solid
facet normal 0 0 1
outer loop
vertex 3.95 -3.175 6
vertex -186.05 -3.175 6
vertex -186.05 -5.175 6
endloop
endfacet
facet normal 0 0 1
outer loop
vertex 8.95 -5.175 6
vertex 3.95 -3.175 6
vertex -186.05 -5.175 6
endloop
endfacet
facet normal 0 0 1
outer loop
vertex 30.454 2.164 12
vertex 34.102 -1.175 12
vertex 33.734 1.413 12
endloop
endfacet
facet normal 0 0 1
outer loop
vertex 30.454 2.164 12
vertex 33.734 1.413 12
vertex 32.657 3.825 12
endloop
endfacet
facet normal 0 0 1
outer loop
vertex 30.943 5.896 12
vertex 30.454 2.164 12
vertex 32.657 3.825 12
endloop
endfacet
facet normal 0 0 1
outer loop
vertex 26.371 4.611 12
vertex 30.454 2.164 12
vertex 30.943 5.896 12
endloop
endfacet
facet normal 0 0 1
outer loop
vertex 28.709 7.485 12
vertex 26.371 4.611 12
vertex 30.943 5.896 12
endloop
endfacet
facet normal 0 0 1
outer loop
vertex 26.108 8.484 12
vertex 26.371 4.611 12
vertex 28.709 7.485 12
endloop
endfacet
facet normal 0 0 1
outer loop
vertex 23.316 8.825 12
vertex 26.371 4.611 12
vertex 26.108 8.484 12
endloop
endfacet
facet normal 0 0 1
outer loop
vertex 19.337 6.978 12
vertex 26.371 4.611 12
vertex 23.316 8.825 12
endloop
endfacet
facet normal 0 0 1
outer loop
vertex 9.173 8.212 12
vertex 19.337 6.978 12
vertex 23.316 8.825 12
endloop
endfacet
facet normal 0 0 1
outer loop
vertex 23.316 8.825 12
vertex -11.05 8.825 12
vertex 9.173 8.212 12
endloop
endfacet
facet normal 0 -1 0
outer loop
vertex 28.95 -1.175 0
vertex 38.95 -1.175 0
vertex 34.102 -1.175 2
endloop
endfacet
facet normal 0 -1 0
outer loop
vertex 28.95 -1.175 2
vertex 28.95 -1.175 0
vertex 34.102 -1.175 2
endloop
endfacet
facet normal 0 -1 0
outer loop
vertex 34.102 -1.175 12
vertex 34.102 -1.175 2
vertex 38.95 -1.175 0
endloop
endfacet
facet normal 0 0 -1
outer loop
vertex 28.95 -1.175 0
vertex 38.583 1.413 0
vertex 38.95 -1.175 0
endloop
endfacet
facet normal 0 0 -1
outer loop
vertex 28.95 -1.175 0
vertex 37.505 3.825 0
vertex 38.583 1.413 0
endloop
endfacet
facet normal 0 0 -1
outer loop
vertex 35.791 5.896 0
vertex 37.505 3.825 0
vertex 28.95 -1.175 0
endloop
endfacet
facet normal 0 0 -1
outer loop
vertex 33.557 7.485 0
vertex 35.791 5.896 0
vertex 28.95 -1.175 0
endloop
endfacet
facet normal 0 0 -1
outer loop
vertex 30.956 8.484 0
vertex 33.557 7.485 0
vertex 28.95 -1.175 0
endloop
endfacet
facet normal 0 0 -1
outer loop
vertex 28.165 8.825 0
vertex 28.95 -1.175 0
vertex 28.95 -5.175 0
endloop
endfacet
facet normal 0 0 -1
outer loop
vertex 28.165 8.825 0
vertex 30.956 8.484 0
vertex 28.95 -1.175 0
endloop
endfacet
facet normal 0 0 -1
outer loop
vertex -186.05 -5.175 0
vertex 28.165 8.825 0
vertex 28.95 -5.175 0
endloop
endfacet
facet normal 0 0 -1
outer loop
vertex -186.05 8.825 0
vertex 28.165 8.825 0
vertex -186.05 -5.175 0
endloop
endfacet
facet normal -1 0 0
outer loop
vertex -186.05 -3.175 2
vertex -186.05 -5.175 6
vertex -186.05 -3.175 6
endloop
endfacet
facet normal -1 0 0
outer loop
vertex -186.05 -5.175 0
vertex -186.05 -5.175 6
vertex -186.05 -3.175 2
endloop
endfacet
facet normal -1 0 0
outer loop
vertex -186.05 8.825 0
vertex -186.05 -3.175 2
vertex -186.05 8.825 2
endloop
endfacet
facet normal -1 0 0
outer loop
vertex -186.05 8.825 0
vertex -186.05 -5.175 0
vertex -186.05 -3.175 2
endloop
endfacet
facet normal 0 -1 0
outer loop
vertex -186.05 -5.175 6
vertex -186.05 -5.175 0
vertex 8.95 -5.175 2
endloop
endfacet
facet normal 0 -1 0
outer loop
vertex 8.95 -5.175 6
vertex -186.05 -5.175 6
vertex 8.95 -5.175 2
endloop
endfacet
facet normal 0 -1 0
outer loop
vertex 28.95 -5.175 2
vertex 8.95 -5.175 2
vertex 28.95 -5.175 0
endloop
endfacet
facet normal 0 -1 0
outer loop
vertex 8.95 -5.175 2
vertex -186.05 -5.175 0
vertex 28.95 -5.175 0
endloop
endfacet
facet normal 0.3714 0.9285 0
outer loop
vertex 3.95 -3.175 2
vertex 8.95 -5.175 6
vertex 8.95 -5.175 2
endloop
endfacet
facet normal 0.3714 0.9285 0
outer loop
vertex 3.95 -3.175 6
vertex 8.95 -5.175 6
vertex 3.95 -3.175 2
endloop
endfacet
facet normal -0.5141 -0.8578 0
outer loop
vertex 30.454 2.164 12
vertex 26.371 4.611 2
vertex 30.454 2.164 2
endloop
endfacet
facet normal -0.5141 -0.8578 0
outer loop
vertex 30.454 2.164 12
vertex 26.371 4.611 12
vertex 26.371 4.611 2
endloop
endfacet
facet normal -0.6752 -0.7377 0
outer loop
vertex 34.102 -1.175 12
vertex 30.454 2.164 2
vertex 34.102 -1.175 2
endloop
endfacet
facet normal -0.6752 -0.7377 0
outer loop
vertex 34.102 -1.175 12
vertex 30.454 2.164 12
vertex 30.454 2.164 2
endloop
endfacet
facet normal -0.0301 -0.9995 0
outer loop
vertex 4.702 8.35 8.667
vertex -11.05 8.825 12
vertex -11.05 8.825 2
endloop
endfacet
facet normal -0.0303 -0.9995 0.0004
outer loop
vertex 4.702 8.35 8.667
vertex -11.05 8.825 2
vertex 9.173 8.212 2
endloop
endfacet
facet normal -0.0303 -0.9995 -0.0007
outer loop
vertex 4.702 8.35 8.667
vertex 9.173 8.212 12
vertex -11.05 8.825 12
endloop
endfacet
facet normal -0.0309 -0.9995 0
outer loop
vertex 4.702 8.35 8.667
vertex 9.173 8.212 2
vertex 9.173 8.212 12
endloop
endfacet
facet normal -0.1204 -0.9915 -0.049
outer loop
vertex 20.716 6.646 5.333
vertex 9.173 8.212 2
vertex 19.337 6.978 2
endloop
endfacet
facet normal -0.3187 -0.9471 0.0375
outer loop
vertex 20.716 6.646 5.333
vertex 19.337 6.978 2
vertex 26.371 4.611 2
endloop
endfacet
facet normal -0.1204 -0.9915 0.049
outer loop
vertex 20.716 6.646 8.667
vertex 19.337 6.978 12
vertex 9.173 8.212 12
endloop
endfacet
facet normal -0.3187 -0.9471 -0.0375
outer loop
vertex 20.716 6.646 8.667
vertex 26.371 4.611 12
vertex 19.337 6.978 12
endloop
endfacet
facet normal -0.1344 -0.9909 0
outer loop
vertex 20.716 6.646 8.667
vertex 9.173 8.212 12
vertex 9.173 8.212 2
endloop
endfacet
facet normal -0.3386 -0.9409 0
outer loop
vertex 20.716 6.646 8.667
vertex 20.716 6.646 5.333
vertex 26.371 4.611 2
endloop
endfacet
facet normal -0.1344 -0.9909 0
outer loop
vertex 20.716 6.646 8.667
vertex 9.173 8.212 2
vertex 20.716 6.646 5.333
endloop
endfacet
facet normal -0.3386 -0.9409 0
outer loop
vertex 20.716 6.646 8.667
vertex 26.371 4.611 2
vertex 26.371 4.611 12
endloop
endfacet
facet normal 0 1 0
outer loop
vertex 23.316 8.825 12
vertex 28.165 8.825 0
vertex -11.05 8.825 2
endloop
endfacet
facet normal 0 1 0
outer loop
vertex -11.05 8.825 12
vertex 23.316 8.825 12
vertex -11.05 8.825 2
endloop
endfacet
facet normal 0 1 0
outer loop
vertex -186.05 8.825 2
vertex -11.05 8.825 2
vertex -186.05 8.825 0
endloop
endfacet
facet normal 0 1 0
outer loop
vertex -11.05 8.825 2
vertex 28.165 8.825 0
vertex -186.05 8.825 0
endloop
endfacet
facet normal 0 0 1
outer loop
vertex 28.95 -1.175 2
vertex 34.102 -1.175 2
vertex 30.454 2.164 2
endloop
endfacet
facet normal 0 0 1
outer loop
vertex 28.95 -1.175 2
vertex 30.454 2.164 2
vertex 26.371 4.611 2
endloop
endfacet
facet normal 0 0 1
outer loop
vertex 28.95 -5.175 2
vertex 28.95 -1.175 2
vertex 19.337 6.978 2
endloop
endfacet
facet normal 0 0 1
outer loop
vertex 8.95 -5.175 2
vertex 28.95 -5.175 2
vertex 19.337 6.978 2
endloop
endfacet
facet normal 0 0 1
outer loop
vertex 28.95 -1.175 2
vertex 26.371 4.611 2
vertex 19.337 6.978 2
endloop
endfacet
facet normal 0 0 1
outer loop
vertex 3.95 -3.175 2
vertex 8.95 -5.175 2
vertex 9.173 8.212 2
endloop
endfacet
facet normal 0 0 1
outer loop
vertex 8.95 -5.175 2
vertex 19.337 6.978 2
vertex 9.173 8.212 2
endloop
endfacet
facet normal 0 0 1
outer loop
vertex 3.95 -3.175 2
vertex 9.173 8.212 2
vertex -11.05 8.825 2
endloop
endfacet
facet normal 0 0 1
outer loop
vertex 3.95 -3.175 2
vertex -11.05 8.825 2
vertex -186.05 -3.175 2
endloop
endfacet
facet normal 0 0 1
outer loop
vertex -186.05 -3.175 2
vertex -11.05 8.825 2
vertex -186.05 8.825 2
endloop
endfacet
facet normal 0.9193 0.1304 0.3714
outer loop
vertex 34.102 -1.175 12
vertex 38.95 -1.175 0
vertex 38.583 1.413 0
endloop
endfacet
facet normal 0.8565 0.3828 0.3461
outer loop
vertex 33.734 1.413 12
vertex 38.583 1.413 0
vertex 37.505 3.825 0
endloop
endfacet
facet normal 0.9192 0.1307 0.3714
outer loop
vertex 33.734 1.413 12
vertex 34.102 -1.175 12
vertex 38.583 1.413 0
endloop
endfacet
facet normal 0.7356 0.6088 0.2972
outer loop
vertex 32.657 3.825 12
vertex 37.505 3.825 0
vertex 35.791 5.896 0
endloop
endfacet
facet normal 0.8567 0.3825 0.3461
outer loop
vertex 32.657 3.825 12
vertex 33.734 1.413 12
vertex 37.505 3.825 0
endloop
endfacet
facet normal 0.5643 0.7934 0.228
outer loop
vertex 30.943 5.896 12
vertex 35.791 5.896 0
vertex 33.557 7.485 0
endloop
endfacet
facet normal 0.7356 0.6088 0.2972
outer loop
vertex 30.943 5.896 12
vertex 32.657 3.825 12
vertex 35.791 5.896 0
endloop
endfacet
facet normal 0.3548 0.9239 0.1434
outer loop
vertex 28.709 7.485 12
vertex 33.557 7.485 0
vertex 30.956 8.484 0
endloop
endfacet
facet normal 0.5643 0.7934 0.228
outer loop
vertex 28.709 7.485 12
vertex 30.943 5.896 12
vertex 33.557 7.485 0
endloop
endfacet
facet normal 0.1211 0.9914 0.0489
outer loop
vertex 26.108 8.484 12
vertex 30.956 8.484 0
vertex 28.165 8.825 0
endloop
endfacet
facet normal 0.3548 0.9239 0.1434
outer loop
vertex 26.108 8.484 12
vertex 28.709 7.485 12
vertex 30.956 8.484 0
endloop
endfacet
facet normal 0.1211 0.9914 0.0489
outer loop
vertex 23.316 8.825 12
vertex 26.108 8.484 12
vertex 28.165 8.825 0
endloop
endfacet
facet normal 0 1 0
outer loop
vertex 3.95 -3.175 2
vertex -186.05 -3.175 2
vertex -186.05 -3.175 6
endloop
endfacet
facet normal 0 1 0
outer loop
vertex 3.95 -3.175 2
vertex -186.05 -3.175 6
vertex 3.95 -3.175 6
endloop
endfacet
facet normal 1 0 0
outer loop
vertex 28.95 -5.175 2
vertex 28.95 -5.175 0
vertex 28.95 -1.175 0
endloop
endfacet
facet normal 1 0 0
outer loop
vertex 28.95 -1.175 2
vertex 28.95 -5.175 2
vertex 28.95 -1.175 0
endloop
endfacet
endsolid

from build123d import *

# Parameters (mm, degrees)
SKETCH1_W           = 215
SKETCH1_H           = 14
BOSS_EXTRUDE1_DEPTH = 2
SKETCH2_W           = 215
SKETCH2_H           = 2
BOSS_EXTRUDE2_DEPTH = 4
SKETCH3_W           = 10
SKETCH3_H           = 10
BOSS_EXTRUDE3_DEPTH = 2
CUT_EXTRUDE1_DEPTH  = 4
BOSS_EXTRUDE4_START = -175
SKETCH8_W           = 10
SKETCH8_H           = 10
BOSS_EXTRUDE4_DEPTH = 50
CUT_EXTRUDE5_DEPTH  = 50
FILLET2_R           = 10
CUT_EXTRUDE6_DEPTH  = 10


with BuildPart() as part:
    # Sketch1 → Boss-Extrude1 (new body)
    with BuildSketch(Plane.XY):
        with Locations((-78.55, 1.825)):
            Rectangle(SKETCH1_W, SKETCH1_H)
    extrude(amount=BOSS_EXTRUDE1_DEPTH)

    # Sketch2 → Boss-Extrude2 (add)
    with BuildSketch(Plane.XY.offset(2)):
        with Locations((-78.55, -4.175)):
            Rectangle(SKETCH2_W, SKETCH2_H)
    extrude(amount=BOSS_EXTRUDE2_DEPTH)

    # Sketch3 → Boss-Extrude3 (add)
    with BuildSketch(Plane(origin=(0, 0, 0), x_dir=(-1, 0, 0), z_dir=(0, 0, -1))):
        with Locations((-33.95, 3.825)):
            Rectangle(SKETCH3_W, SKETCH3_H)
    extrude(amount=-BOSS_EXTRUDE3_DEPTH)

    # Sketch4 → Cut-Extrude1 (cut)
    with BuildSketch(Plane.XY.offset(6)):
        Polygon((28.95, -5.175), (8.95, -5.175), (3.95, -3.175), (28.95, -3.175), align=None)
    extrude(amount=-CUT_EXTRUDE1_DEPTH, mode=Mode.SUBTRACT)

    # Sketch8 → Boss-Extrude4 (add)
    with BuildSketch(Plane.ZY.offset(186.05).offset(BOSS_EXTRUDE4_START)):
        with Locations((7, 3.825)):
            Rectangle(SKETCH8_W, SKETCH8_H)
    extrude(amount=-BOSS_EXTRUDE4_DEPTH)

    # Sketch12 → Cut-Extrude5 (cut)
    with BuildSketch(Plane.XZ.offset(1.175)):
        Polygon((38.95, 0), (34.10168529, 12), (38.95, 12), align=None)
    extrude(amount=-CUT_EXTRUDE5_DEPTH, mode=Mode.SUBTRACT)

    # Fillet2
    fillet2_edges = [part.edges().sort_by_distance(p)[0] for p in [
        (36.525842645, 8.825, 6),
    ]]
    fillet(fillet2_edges, radius=FILLET2_R - 0.0001)  # a hair under: the kernel refuses the full size

    # Sketch13 → Cut-Extrude6 (cut)
    with BuildSketch(Plane.XY.offset(12)):
        with BuildLine():
            Line((-11.05, 8.825), (-11.05, -1.175))
            Line((-11.05, -1.175), (34.10168529, -1.175))
            add(Edge.make_bspline(
                [(-11.05, 8.825), (3.606248202, 7.334330419), (22.993995007, 11.334895317), (34.10168529, -1.175)],
                knots=[0, 0, 0, 0, 1, 1, 1, 1], degree=3))
        make_face()
    extrude(amount=-CUT_EXTRUDE6_DEPTH, mode=Mode.SUBTRACT)


solid = part.part
